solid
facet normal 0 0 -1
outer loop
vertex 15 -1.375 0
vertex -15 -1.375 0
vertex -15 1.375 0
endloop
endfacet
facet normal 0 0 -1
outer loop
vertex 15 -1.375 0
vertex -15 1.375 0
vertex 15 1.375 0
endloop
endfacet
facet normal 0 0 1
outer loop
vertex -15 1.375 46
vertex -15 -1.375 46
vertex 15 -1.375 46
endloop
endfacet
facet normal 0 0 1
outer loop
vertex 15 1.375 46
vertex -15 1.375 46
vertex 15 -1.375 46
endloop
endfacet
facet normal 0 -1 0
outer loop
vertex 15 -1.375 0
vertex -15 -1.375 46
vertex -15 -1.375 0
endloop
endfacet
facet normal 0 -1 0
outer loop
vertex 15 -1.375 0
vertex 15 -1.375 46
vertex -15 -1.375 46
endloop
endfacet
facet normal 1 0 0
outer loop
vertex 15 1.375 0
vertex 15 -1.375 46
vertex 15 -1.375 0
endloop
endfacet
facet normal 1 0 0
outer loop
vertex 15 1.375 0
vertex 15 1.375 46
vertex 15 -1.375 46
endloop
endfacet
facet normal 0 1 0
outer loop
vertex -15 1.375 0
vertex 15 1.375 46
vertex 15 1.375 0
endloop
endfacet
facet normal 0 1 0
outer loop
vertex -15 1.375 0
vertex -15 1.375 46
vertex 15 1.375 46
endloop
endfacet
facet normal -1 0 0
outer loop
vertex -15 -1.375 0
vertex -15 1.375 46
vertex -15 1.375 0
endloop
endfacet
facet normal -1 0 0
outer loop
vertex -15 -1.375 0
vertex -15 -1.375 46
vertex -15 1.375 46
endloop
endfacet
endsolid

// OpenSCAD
vyska = 60; //celeho slouplku
zapust = 6.5; //vyska zapusteni listy 
vule_vysky_celicka =1; //definuje vůli celicka v liste
delka_celicka=30;
tloustka_celicka = 3;
vule_tlousky = 0.25;

difference () {
color("cyan")
    translate([0, 0, 0])
        linear_extrude(height = vyska-2*zapust-vule_vysky_celicka)
            square([delka_celicka, tloustka_celicka-vule_tlousky], center = true); 
    
     }
